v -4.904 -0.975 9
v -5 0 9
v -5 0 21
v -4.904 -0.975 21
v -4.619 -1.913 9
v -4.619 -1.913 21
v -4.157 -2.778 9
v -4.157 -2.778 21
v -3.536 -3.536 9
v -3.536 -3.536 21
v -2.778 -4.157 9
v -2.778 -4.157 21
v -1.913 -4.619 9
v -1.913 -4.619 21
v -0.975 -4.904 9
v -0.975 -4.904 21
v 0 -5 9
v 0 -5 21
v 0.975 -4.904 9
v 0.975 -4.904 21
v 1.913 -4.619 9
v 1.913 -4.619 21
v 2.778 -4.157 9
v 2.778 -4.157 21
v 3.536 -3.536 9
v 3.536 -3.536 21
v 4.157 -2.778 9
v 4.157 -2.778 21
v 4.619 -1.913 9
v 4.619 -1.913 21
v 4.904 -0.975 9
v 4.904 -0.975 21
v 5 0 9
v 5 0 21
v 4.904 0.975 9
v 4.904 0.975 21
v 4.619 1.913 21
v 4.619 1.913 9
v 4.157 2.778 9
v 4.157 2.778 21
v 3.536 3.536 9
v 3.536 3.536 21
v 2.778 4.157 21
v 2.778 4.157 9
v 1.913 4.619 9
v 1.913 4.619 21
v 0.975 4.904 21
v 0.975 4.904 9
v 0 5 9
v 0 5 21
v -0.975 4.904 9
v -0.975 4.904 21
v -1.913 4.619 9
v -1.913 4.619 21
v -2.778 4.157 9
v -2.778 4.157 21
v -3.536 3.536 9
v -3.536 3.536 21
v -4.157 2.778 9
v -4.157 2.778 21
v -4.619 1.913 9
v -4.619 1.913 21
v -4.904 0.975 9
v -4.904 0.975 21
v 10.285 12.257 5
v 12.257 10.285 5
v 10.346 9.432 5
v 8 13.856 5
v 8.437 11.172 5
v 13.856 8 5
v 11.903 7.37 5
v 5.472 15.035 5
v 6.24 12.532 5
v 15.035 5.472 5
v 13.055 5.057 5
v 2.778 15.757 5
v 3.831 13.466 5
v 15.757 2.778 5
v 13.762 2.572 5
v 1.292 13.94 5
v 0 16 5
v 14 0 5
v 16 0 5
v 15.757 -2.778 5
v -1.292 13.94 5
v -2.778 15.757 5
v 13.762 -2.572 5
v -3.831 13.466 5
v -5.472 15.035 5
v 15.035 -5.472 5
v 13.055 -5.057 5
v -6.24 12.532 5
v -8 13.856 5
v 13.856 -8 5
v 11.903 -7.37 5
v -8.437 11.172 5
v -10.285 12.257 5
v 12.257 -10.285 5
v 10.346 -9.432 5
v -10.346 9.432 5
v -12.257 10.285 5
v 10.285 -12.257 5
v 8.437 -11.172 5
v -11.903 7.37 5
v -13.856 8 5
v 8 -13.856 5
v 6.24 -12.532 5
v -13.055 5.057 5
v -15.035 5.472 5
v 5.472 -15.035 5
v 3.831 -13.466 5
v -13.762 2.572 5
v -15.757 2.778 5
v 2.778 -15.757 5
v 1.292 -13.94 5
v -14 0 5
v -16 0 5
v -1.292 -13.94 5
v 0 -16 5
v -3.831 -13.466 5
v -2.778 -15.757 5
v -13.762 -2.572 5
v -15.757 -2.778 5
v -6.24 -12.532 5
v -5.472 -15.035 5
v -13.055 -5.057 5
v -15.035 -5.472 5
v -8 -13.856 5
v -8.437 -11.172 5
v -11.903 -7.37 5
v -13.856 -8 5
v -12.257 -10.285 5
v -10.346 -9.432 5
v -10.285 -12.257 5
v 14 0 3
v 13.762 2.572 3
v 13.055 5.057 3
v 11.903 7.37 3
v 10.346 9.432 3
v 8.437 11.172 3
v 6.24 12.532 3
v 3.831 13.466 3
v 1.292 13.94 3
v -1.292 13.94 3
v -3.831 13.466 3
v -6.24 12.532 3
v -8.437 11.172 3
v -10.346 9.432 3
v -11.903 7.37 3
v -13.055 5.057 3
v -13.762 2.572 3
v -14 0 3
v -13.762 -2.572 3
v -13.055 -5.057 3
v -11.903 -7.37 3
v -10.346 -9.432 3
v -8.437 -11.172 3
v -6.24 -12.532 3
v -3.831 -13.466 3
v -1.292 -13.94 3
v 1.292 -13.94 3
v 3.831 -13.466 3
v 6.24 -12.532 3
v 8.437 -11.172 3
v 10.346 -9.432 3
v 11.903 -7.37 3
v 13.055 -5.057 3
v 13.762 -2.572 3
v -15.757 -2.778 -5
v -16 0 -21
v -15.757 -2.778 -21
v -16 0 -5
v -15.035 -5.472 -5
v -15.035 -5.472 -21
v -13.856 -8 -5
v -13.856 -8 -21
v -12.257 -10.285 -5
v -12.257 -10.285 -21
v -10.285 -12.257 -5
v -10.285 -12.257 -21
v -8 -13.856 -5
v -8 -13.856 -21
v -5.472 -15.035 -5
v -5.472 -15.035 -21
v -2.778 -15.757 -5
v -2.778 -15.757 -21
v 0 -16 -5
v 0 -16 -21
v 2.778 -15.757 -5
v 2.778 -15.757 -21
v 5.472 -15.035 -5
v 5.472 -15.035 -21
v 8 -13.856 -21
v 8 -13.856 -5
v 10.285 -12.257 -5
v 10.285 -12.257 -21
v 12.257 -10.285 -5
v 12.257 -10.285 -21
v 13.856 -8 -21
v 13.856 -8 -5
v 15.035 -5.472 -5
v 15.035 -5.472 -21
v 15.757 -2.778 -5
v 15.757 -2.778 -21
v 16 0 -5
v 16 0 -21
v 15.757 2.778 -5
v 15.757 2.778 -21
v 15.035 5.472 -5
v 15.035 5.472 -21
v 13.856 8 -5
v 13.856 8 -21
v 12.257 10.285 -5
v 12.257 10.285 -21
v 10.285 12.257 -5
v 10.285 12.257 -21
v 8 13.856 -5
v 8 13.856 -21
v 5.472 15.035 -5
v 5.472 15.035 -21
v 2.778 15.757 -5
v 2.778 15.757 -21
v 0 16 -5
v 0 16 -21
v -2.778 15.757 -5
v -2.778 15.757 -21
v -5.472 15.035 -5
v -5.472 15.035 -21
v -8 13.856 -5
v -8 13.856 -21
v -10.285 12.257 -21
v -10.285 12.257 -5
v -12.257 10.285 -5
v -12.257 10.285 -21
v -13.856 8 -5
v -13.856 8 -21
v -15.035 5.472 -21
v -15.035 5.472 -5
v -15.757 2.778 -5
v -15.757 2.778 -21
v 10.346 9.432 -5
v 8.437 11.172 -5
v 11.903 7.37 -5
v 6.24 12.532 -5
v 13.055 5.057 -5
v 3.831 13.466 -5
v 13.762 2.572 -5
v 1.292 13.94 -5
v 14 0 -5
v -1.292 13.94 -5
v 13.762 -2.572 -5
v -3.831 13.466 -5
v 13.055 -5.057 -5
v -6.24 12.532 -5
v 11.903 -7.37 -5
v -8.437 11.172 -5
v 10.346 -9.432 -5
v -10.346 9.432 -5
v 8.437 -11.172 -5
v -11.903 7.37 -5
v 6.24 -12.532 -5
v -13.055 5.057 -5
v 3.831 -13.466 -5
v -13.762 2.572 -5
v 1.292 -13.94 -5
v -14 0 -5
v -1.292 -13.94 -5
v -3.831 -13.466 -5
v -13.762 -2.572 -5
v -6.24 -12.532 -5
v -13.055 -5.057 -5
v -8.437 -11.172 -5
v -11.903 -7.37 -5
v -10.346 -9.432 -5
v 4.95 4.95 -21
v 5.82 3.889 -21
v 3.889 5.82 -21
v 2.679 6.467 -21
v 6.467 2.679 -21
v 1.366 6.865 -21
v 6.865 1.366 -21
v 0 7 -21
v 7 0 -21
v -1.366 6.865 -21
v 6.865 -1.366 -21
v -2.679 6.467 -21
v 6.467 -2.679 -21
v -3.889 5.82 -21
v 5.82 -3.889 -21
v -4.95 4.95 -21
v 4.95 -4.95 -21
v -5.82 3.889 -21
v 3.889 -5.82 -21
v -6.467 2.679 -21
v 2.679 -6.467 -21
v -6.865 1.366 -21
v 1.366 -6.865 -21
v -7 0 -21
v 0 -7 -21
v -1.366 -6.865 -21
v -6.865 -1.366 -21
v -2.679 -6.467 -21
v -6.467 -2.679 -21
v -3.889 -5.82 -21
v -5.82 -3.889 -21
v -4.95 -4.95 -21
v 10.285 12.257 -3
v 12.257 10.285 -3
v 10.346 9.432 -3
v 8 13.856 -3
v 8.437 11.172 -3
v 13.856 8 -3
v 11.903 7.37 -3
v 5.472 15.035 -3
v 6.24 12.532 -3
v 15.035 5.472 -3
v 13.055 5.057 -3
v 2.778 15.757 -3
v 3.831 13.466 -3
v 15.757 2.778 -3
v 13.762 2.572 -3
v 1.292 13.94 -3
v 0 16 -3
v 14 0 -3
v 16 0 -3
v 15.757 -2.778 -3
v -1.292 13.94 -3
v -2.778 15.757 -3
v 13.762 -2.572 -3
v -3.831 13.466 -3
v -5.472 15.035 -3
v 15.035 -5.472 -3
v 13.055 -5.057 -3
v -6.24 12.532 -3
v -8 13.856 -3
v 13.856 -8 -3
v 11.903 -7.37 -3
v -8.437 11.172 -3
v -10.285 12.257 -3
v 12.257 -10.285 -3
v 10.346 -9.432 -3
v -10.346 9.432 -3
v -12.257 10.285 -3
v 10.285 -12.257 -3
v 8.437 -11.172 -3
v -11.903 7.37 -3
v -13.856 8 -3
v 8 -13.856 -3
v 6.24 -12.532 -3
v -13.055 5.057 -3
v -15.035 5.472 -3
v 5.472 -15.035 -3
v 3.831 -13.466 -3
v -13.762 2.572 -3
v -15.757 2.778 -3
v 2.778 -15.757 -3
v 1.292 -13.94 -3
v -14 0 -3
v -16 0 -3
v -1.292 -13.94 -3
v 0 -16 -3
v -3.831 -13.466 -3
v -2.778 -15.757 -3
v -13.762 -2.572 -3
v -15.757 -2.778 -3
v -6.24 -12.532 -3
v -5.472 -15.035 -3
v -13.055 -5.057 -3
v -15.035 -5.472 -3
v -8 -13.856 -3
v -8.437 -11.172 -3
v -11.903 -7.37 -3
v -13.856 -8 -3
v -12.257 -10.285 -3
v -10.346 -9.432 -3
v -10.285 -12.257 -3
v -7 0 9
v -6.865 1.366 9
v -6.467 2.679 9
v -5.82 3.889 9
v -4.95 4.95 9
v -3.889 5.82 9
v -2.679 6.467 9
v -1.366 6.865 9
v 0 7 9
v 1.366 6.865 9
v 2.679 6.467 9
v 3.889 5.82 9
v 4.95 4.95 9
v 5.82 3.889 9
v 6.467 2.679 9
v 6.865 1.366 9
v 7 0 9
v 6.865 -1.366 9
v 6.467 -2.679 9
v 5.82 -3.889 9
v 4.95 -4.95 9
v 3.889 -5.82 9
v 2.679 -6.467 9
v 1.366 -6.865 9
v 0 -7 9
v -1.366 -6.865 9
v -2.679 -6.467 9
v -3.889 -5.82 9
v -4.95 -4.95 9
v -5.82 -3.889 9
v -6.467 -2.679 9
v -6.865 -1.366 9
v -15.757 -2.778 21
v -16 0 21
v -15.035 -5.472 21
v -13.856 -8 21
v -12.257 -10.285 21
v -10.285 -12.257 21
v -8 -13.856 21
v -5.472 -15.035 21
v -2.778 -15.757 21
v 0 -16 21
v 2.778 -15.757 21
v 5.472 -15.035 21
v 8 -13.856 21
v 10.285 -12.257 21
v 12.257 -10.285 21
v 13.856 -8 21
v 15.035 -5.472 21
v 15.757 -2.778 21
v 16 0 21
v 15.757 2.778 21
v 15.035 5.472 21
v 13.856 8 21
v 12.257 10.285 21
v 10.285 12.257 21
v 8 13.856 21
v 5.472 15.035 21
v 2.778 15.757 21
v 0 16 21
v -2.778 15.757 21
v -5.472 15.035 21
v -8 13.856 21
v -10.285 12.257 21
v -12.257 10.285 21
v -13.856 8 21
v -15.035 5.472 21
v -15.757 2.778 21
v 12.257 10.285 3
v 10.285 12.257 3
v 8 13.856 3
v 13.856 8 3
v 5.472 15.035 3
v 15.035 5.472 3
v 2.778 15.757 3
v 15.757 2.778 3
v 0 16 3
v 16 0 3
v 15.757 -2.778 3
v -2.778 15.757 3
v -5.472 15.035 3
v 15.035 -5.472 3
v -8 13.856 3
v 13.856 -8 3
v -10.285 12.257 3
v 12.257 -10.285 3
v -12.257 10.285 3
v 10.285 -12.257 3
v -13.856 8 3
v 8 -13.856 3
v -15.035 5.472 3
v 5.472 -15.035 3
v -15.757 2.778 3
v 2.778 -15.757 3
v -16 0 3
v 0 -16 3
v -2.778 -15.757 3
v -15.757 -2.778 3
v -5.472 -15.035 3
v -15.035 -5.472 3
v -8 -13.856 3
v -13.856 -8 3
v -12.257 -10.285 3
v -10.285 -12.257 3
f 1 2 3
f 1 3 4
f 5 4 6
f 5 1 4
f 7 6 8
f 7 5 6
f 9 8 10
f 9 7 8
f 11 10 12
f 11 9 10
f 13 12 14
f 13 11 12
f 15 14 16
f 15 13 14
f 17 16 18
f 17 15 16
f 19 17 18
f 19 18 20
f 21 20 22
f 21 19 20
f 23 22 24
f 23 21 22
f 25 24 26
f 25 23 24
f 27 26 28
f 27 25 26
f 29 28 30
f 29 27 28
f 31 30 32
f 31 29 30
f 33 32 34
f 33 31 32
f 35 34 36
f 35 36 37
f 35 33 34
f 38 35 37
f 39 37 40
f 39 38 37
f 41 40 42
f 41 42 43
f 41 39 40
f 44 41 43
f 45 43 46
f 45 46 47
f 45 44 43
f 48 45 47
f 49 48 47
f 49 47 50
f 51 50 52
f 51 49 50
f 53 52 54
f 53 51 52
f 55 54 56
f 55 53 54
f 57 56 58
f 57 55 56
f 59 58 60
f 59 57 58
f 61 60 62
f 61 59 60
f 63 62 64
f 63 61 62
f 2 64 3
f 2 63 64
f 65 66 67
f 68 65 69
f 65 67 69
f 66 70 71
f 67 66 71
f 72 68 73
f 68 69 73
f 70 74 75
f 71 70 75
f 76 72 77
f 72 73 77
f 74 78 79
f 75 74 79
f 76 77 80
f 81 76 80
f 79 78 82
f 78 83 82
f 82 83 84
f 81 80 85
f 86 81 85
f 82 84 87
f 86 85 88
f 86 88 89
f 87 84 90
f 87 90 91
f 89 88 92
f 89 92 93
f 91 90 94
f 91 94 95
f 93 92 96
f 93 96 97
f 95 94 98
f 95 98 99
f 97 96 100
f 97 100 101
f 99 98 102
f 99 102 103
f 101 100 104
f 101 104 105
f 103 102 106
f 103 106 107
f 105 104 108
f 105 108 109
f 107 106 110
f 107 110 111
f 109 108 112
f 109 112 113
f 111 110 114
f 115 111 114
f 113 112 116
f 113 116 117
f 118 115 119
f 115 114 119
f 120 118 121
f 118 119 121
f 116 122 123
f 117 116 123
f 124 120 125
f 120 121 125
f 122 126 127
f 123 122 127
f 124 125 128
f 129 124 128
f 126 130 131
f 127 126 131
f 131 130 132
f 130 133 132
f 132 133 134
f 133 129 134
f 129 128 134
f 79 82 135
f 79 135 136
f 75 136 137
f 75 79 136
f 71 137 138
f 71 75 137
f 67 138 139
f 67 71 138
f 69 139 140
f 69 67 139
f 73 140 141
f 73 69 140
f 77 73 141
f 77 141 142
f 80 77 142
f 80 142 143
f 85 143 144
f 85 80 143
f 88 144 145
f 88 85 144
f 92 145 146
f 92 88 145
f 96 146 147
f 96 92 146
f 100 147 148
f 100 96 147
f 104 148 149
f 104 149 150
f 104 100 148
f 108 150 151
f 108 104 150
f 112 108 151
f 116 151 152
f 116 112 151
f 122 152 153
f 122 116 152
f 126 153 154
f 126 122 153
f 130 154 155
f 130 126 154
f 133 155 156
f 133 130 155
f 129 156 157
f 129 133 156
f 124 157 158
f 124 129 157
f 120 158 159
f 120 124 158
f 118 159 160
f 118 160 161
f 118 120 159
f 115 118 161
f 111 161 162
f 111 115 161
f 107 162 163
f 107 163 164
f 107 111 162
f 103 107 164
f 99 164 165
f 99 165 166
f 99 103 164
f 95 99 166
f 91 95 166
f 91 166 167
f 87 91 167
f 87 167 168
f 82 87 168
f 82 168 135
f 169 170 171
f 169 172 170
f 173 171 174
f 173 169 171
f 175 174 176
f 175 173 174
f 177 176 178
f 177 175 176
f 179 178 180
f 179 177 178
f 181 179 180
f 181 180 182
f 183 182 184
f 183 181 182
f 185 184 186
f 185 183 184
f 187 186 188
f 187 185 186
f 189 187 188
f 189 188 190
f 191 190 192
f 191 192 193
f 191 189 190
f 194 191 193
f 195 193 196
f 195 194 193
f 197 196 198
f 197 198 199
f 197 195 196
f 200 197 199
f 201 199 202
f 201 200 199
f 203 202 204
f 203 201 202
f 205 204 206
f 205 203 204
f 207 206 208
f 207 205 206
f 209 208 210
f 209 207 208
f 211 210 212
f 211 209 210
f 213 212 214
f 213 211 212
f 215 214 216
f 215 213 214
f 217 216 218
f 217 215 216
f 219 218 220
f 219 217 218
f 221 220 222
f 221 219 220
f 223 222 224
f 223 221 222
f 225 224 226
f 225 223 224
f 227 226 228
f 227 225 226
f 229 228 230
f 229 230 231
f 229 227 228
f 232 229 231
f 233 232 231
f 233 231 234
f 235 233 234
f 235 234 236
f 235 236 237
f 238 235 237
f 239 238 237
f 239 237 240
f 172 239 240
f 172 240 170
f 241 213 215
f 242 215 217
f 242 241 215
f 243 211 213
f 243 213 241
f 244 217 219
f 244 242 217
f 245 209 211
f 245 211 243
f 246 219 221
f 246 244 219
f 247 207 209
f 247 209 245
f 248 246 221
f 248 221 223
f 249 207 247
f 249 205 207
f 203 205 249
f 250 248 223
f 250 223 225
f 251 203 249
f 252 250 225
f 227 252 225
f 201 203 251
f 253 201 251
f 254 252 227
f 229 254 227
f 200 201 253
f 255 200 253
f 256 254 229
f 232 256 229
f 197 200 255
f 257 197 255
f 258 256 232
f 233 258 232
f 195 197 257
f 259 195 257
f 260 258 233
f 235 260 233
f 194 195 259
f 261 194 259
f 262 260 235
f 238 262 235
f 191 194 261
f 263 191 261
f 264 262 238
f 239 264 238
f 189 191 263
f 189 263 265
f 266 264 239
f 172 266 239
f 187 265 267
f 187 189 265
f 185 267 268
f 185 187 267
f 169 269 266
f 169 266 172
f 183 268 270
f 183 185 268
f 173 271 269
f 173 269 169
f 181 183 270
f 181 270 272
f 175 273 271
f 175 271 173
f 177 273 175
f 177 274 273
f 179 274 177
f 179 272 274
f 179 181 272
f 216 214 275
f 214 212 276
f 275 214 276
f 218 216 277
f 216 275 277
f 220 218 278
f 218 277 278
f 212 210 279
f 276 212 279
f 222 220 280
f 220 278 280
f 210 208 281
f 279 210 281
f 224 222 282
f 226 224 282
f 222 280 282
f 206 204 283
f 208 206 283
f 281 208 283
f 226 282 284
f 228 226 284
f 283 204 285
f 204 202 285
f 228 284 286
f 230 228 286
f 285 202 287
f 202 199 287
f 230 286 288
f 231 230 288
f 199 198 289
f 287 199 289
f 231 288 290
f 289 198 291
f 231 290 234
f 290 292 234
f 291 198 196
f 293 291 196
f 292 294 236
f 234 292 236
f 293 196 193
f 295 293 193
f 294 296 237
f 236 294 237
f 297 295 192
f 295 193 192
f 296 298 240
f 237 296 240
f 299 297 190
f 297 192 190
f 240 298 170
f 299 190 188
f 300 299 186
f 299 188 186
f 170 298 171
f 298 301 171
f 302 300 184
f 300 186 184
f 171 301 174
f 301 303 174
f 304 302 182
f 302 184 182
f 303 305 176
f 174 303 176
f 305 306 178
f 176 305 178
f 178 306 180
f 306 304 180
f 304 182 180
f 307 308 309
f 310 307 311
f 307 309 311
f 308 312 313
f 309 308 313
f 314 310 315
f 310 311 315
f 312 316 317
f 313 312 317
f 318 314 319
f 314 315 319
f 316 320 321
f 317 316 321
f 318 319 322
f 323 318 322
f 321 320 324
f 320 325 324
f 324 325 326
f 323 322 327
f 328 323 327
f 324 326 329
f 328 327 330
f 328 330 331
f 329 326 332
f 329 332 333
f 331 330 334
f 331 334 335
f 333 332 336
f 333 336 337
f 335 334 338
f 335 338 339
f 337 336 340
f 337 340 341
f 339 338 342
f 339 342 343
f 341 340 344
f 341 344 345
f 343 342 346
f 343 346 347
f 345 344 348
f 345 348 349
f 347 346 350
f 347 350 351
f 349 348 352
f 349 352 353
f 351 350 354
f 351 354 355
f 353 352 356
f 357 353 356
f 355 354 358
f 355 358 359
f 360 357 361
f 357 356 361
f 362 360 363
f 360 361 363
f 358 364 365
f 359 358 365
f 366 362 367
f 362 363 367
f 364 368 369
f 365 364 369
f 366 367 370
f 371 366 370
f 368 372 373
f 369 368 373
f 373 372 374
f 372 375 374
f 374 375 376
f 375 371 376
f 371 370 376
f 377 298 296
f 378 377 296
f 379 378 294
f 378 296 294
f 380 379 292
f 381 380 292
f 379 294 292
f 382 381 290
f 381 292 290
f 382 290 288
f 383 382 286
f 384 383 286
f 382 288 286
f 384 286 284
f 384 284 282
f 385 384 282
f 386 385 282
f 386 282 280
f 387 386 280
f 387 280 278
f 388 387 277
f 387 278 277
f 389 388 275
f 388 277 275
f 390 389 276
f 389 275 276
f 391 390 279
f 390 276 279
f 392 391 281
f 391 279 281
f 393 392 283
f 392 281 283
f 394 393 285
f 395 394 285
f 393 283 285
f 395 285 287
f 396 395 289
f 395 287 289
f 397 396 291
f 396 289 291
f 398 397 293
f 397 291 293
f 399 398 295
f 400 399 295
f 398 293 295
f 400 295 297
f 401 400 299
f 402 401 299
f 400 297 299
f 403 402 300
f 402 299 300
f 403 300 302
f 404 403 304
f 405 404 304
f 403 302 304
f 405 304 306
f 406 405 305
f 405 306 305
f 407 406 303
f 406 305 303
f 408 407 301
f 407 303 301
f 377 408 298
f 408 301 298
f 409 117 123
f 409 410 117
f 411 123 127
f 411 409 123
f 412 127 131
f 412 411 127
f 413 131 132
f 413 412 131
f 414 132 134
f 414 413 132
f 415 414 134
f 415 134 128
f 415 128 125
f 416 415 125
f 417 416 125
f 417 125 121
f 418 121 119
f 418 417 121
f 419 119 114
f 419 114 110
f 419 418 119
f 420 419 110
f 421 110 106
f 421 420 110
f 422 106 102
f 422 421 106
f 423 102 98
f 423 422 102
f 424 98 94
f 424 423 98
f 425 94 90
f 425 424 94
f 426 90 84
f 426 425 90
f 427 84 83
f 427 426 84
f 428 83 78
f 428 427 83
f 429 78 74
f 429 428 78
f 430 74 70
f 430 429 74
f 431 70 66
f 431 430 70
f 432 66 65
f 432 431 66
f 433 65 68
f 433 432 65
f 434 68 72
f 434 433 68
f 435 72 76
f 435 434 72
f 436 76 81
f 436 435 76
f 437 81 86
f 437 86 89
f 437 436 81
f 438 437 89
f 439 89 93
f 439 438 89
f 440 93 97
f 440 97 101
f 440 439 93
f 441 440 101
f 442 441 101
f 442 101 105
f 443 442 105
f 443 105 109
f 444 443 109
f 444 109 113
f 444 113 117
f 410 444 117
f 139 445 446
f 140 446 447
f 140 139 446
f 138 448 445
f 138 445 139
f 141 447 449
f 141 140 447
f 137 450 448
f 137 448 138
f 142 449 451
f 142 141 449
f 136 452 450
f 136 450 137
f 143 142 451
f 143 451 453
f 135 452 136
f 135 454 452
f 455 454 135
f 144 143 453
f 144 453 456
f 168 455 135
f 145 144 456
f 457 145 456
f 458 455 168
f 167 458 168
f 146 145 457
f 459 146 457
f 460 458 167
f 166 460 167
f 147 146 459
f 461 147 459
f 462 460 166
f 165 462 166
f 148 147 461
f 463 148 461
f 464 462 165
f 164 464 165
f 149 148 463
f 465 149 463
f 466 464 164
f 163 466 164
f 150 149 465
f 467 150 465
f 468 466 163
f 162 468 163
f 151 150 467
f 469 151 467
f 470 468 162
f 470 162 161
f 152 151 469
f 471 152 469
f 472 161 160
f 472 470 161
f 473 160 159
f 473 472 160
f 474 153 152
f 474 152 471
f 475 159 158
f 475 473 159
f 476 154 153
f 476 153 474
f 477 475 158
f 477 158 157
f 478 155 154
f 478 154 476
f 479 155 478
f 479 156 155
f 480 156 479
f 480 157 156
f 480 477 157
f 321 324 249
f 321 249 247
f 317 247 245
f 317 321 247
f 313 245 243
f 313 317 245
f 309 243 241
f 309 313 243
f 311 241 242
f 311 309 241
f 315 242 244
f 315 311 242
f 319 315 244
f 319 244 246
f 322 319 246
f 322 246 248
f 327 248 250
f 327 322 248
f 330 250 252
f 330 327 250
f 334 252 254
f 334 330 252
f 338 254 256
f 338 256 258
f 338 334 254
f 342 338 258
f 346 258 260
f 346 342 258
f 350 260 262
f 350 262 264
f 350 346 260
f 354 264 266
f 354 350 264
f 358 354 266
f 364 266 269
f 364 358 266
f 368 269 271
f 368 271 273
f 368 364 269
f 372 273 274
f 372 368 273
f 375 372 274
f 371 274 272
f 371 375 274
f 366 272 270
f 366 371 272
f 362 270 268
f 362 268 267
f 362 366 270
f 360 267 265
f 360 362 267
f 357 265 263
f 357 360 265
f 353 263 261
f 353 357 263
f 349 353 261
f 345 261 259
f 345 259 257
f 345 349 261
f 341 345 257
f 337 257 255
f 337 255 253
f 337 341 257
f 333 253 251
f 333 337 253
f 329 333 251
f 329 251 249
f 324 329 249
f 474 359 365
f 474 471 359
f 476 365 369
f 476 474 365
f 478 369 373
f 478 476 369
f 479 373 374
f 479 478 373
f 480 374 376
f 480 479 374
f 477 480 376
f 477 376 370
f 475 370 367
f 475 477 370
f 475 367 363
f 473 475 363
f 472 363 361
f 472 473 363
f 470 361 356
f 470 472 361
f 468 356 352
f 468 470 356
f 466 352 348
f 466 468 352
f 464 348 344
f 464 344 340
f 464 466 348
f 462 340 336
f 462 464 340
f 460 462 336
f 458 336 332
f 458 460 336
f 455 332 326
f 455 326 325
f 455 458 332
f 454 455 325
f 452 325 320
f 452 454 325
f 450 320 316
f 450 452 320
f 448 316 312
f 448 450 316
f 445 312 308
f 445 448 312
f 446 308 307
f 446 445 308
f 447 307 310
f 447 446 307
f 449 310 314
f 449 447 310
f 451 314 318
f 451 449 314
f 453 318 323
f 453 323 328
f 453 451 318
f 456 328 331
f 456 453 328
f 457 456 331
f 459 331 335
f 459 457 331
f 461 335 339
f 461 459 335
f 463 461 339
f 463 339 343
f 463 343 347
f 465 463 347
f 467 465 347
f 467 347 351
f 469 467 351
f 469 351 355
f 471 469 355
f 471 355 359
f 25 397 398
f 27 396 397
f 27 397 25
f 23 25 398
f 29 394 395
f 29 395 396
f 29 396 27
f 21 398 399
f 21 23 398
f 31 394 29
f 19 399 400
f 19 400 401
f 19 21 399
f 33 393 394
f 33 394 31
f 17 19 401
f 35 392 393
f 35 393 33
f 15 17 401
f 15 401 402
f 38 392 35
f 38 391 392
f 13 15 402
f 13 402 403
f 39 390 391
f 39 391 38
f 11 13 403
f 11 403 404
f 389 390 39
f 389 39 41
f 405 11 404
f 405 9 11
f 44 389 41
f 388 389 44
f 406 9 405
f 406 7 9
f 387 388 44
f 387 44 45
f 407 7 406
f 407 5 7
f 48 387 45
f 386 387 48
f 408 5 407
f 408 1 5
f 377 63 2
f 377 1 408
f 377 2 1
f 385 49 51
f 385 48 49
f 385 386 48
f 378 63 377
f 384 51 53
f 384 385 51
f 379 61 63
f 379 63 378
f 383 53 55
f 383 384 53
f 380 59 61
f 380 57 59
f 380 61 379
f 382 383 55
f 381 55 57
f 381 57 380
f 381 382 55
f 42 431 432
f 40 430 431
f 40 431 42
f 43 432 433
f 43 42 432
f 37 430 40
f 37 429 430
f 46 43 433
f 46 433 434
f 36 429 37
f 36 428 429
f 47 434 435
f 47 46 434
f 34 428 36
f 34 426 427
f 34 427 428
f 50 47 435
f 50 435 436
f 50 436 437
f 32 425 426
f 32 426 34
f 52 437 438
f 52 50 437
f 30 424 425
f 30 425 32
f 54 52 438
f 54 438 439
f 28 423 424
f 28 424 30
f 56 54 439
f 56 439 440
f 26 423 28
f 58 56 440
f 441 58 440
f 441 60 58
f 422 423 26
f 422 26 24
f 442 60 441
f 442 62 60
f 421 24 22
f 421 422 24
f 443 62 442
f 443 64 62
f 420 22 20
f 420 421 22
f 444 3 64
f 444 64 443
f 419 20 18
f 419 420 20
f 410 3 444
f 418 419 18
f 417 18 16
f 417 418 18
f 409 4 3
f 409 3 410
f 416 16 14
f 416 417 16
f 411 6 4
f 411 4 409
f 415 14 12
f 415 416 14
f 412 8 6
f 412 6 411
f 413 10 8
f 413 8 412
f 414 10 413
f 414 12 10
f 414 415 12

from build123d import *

# Parameters (mm, degrees)
SKETCH_1_R          = 16
SKETCH_1_R_2        = 5
EXTRUDE_1_DEPTH     = 21
SKETCH_2_R          = 7
CUT_EXTRUDE_1_DEPTH = 30
CUT_EXTRUDE_START   = 5
SKETCH_3_R          = 16
SKETCH_3_R_2        = 14
CUT_EXTRUDE_3_DEPTH = 2
CUT_EXTRUDE_START_2 = -3
SKETCH_3_2_R        = 16
SKETCH_3_2_R_2      = 14
CUT_EXTRUDE_4_DEPTH = 2


with BuildPart() as part:
    # 스케치1 → 보스-돌출1 (new, symmetric)
    with BuildSketch(Plane.XY):
        Circle(SKETCH_1_R)
        Circle(SKETCH_1_R_2, mode=Mode.SUBTRACT)
    extrude(amount=EXTRUDE_1_DEPTH, both=True)

    # 스케치2 → 컷-돌출1 (cut)
    with BuildSketch(Plane(origin=(0, 0, -21), x_dir=(-1, 0, 0), z_dir=(0, 0, -1))):
        Circle(SKETCH_2_R)
    extrude(amount=-CUT_EXTRUDE_1_DEPTH, mode=Mode.SUBTRACT)

    # 스케치3 → 컷-돌출3 (cut)
    with BuildSketch(Plane.XY.offset(CUT_EXTRUDE_START)):
        Circle(SKETCH_3_R)
        Circle(SKETCH_3_R_2, mode=Mode.SUBTRACT)
    extrude(amount=-CUT_EXTRUDE_3_DEPTH, mode=Mode.SUBTRACT)

    # 스케치3<2> → 컷-돌출4 (cut)
    with BuildSketch(Plane.XY.offset(CUT_EXTRUDE_START_2)):
        Circle(SKETCH_3_2_R)
        Circle(SKETCH_3_2_R_2, mode=Mode.SUBTRACT)
    extrude(amount=-CUT_EXTRUDE_4_DEPTH, mode=Mode.SUBTRACT)


solid = part.part
